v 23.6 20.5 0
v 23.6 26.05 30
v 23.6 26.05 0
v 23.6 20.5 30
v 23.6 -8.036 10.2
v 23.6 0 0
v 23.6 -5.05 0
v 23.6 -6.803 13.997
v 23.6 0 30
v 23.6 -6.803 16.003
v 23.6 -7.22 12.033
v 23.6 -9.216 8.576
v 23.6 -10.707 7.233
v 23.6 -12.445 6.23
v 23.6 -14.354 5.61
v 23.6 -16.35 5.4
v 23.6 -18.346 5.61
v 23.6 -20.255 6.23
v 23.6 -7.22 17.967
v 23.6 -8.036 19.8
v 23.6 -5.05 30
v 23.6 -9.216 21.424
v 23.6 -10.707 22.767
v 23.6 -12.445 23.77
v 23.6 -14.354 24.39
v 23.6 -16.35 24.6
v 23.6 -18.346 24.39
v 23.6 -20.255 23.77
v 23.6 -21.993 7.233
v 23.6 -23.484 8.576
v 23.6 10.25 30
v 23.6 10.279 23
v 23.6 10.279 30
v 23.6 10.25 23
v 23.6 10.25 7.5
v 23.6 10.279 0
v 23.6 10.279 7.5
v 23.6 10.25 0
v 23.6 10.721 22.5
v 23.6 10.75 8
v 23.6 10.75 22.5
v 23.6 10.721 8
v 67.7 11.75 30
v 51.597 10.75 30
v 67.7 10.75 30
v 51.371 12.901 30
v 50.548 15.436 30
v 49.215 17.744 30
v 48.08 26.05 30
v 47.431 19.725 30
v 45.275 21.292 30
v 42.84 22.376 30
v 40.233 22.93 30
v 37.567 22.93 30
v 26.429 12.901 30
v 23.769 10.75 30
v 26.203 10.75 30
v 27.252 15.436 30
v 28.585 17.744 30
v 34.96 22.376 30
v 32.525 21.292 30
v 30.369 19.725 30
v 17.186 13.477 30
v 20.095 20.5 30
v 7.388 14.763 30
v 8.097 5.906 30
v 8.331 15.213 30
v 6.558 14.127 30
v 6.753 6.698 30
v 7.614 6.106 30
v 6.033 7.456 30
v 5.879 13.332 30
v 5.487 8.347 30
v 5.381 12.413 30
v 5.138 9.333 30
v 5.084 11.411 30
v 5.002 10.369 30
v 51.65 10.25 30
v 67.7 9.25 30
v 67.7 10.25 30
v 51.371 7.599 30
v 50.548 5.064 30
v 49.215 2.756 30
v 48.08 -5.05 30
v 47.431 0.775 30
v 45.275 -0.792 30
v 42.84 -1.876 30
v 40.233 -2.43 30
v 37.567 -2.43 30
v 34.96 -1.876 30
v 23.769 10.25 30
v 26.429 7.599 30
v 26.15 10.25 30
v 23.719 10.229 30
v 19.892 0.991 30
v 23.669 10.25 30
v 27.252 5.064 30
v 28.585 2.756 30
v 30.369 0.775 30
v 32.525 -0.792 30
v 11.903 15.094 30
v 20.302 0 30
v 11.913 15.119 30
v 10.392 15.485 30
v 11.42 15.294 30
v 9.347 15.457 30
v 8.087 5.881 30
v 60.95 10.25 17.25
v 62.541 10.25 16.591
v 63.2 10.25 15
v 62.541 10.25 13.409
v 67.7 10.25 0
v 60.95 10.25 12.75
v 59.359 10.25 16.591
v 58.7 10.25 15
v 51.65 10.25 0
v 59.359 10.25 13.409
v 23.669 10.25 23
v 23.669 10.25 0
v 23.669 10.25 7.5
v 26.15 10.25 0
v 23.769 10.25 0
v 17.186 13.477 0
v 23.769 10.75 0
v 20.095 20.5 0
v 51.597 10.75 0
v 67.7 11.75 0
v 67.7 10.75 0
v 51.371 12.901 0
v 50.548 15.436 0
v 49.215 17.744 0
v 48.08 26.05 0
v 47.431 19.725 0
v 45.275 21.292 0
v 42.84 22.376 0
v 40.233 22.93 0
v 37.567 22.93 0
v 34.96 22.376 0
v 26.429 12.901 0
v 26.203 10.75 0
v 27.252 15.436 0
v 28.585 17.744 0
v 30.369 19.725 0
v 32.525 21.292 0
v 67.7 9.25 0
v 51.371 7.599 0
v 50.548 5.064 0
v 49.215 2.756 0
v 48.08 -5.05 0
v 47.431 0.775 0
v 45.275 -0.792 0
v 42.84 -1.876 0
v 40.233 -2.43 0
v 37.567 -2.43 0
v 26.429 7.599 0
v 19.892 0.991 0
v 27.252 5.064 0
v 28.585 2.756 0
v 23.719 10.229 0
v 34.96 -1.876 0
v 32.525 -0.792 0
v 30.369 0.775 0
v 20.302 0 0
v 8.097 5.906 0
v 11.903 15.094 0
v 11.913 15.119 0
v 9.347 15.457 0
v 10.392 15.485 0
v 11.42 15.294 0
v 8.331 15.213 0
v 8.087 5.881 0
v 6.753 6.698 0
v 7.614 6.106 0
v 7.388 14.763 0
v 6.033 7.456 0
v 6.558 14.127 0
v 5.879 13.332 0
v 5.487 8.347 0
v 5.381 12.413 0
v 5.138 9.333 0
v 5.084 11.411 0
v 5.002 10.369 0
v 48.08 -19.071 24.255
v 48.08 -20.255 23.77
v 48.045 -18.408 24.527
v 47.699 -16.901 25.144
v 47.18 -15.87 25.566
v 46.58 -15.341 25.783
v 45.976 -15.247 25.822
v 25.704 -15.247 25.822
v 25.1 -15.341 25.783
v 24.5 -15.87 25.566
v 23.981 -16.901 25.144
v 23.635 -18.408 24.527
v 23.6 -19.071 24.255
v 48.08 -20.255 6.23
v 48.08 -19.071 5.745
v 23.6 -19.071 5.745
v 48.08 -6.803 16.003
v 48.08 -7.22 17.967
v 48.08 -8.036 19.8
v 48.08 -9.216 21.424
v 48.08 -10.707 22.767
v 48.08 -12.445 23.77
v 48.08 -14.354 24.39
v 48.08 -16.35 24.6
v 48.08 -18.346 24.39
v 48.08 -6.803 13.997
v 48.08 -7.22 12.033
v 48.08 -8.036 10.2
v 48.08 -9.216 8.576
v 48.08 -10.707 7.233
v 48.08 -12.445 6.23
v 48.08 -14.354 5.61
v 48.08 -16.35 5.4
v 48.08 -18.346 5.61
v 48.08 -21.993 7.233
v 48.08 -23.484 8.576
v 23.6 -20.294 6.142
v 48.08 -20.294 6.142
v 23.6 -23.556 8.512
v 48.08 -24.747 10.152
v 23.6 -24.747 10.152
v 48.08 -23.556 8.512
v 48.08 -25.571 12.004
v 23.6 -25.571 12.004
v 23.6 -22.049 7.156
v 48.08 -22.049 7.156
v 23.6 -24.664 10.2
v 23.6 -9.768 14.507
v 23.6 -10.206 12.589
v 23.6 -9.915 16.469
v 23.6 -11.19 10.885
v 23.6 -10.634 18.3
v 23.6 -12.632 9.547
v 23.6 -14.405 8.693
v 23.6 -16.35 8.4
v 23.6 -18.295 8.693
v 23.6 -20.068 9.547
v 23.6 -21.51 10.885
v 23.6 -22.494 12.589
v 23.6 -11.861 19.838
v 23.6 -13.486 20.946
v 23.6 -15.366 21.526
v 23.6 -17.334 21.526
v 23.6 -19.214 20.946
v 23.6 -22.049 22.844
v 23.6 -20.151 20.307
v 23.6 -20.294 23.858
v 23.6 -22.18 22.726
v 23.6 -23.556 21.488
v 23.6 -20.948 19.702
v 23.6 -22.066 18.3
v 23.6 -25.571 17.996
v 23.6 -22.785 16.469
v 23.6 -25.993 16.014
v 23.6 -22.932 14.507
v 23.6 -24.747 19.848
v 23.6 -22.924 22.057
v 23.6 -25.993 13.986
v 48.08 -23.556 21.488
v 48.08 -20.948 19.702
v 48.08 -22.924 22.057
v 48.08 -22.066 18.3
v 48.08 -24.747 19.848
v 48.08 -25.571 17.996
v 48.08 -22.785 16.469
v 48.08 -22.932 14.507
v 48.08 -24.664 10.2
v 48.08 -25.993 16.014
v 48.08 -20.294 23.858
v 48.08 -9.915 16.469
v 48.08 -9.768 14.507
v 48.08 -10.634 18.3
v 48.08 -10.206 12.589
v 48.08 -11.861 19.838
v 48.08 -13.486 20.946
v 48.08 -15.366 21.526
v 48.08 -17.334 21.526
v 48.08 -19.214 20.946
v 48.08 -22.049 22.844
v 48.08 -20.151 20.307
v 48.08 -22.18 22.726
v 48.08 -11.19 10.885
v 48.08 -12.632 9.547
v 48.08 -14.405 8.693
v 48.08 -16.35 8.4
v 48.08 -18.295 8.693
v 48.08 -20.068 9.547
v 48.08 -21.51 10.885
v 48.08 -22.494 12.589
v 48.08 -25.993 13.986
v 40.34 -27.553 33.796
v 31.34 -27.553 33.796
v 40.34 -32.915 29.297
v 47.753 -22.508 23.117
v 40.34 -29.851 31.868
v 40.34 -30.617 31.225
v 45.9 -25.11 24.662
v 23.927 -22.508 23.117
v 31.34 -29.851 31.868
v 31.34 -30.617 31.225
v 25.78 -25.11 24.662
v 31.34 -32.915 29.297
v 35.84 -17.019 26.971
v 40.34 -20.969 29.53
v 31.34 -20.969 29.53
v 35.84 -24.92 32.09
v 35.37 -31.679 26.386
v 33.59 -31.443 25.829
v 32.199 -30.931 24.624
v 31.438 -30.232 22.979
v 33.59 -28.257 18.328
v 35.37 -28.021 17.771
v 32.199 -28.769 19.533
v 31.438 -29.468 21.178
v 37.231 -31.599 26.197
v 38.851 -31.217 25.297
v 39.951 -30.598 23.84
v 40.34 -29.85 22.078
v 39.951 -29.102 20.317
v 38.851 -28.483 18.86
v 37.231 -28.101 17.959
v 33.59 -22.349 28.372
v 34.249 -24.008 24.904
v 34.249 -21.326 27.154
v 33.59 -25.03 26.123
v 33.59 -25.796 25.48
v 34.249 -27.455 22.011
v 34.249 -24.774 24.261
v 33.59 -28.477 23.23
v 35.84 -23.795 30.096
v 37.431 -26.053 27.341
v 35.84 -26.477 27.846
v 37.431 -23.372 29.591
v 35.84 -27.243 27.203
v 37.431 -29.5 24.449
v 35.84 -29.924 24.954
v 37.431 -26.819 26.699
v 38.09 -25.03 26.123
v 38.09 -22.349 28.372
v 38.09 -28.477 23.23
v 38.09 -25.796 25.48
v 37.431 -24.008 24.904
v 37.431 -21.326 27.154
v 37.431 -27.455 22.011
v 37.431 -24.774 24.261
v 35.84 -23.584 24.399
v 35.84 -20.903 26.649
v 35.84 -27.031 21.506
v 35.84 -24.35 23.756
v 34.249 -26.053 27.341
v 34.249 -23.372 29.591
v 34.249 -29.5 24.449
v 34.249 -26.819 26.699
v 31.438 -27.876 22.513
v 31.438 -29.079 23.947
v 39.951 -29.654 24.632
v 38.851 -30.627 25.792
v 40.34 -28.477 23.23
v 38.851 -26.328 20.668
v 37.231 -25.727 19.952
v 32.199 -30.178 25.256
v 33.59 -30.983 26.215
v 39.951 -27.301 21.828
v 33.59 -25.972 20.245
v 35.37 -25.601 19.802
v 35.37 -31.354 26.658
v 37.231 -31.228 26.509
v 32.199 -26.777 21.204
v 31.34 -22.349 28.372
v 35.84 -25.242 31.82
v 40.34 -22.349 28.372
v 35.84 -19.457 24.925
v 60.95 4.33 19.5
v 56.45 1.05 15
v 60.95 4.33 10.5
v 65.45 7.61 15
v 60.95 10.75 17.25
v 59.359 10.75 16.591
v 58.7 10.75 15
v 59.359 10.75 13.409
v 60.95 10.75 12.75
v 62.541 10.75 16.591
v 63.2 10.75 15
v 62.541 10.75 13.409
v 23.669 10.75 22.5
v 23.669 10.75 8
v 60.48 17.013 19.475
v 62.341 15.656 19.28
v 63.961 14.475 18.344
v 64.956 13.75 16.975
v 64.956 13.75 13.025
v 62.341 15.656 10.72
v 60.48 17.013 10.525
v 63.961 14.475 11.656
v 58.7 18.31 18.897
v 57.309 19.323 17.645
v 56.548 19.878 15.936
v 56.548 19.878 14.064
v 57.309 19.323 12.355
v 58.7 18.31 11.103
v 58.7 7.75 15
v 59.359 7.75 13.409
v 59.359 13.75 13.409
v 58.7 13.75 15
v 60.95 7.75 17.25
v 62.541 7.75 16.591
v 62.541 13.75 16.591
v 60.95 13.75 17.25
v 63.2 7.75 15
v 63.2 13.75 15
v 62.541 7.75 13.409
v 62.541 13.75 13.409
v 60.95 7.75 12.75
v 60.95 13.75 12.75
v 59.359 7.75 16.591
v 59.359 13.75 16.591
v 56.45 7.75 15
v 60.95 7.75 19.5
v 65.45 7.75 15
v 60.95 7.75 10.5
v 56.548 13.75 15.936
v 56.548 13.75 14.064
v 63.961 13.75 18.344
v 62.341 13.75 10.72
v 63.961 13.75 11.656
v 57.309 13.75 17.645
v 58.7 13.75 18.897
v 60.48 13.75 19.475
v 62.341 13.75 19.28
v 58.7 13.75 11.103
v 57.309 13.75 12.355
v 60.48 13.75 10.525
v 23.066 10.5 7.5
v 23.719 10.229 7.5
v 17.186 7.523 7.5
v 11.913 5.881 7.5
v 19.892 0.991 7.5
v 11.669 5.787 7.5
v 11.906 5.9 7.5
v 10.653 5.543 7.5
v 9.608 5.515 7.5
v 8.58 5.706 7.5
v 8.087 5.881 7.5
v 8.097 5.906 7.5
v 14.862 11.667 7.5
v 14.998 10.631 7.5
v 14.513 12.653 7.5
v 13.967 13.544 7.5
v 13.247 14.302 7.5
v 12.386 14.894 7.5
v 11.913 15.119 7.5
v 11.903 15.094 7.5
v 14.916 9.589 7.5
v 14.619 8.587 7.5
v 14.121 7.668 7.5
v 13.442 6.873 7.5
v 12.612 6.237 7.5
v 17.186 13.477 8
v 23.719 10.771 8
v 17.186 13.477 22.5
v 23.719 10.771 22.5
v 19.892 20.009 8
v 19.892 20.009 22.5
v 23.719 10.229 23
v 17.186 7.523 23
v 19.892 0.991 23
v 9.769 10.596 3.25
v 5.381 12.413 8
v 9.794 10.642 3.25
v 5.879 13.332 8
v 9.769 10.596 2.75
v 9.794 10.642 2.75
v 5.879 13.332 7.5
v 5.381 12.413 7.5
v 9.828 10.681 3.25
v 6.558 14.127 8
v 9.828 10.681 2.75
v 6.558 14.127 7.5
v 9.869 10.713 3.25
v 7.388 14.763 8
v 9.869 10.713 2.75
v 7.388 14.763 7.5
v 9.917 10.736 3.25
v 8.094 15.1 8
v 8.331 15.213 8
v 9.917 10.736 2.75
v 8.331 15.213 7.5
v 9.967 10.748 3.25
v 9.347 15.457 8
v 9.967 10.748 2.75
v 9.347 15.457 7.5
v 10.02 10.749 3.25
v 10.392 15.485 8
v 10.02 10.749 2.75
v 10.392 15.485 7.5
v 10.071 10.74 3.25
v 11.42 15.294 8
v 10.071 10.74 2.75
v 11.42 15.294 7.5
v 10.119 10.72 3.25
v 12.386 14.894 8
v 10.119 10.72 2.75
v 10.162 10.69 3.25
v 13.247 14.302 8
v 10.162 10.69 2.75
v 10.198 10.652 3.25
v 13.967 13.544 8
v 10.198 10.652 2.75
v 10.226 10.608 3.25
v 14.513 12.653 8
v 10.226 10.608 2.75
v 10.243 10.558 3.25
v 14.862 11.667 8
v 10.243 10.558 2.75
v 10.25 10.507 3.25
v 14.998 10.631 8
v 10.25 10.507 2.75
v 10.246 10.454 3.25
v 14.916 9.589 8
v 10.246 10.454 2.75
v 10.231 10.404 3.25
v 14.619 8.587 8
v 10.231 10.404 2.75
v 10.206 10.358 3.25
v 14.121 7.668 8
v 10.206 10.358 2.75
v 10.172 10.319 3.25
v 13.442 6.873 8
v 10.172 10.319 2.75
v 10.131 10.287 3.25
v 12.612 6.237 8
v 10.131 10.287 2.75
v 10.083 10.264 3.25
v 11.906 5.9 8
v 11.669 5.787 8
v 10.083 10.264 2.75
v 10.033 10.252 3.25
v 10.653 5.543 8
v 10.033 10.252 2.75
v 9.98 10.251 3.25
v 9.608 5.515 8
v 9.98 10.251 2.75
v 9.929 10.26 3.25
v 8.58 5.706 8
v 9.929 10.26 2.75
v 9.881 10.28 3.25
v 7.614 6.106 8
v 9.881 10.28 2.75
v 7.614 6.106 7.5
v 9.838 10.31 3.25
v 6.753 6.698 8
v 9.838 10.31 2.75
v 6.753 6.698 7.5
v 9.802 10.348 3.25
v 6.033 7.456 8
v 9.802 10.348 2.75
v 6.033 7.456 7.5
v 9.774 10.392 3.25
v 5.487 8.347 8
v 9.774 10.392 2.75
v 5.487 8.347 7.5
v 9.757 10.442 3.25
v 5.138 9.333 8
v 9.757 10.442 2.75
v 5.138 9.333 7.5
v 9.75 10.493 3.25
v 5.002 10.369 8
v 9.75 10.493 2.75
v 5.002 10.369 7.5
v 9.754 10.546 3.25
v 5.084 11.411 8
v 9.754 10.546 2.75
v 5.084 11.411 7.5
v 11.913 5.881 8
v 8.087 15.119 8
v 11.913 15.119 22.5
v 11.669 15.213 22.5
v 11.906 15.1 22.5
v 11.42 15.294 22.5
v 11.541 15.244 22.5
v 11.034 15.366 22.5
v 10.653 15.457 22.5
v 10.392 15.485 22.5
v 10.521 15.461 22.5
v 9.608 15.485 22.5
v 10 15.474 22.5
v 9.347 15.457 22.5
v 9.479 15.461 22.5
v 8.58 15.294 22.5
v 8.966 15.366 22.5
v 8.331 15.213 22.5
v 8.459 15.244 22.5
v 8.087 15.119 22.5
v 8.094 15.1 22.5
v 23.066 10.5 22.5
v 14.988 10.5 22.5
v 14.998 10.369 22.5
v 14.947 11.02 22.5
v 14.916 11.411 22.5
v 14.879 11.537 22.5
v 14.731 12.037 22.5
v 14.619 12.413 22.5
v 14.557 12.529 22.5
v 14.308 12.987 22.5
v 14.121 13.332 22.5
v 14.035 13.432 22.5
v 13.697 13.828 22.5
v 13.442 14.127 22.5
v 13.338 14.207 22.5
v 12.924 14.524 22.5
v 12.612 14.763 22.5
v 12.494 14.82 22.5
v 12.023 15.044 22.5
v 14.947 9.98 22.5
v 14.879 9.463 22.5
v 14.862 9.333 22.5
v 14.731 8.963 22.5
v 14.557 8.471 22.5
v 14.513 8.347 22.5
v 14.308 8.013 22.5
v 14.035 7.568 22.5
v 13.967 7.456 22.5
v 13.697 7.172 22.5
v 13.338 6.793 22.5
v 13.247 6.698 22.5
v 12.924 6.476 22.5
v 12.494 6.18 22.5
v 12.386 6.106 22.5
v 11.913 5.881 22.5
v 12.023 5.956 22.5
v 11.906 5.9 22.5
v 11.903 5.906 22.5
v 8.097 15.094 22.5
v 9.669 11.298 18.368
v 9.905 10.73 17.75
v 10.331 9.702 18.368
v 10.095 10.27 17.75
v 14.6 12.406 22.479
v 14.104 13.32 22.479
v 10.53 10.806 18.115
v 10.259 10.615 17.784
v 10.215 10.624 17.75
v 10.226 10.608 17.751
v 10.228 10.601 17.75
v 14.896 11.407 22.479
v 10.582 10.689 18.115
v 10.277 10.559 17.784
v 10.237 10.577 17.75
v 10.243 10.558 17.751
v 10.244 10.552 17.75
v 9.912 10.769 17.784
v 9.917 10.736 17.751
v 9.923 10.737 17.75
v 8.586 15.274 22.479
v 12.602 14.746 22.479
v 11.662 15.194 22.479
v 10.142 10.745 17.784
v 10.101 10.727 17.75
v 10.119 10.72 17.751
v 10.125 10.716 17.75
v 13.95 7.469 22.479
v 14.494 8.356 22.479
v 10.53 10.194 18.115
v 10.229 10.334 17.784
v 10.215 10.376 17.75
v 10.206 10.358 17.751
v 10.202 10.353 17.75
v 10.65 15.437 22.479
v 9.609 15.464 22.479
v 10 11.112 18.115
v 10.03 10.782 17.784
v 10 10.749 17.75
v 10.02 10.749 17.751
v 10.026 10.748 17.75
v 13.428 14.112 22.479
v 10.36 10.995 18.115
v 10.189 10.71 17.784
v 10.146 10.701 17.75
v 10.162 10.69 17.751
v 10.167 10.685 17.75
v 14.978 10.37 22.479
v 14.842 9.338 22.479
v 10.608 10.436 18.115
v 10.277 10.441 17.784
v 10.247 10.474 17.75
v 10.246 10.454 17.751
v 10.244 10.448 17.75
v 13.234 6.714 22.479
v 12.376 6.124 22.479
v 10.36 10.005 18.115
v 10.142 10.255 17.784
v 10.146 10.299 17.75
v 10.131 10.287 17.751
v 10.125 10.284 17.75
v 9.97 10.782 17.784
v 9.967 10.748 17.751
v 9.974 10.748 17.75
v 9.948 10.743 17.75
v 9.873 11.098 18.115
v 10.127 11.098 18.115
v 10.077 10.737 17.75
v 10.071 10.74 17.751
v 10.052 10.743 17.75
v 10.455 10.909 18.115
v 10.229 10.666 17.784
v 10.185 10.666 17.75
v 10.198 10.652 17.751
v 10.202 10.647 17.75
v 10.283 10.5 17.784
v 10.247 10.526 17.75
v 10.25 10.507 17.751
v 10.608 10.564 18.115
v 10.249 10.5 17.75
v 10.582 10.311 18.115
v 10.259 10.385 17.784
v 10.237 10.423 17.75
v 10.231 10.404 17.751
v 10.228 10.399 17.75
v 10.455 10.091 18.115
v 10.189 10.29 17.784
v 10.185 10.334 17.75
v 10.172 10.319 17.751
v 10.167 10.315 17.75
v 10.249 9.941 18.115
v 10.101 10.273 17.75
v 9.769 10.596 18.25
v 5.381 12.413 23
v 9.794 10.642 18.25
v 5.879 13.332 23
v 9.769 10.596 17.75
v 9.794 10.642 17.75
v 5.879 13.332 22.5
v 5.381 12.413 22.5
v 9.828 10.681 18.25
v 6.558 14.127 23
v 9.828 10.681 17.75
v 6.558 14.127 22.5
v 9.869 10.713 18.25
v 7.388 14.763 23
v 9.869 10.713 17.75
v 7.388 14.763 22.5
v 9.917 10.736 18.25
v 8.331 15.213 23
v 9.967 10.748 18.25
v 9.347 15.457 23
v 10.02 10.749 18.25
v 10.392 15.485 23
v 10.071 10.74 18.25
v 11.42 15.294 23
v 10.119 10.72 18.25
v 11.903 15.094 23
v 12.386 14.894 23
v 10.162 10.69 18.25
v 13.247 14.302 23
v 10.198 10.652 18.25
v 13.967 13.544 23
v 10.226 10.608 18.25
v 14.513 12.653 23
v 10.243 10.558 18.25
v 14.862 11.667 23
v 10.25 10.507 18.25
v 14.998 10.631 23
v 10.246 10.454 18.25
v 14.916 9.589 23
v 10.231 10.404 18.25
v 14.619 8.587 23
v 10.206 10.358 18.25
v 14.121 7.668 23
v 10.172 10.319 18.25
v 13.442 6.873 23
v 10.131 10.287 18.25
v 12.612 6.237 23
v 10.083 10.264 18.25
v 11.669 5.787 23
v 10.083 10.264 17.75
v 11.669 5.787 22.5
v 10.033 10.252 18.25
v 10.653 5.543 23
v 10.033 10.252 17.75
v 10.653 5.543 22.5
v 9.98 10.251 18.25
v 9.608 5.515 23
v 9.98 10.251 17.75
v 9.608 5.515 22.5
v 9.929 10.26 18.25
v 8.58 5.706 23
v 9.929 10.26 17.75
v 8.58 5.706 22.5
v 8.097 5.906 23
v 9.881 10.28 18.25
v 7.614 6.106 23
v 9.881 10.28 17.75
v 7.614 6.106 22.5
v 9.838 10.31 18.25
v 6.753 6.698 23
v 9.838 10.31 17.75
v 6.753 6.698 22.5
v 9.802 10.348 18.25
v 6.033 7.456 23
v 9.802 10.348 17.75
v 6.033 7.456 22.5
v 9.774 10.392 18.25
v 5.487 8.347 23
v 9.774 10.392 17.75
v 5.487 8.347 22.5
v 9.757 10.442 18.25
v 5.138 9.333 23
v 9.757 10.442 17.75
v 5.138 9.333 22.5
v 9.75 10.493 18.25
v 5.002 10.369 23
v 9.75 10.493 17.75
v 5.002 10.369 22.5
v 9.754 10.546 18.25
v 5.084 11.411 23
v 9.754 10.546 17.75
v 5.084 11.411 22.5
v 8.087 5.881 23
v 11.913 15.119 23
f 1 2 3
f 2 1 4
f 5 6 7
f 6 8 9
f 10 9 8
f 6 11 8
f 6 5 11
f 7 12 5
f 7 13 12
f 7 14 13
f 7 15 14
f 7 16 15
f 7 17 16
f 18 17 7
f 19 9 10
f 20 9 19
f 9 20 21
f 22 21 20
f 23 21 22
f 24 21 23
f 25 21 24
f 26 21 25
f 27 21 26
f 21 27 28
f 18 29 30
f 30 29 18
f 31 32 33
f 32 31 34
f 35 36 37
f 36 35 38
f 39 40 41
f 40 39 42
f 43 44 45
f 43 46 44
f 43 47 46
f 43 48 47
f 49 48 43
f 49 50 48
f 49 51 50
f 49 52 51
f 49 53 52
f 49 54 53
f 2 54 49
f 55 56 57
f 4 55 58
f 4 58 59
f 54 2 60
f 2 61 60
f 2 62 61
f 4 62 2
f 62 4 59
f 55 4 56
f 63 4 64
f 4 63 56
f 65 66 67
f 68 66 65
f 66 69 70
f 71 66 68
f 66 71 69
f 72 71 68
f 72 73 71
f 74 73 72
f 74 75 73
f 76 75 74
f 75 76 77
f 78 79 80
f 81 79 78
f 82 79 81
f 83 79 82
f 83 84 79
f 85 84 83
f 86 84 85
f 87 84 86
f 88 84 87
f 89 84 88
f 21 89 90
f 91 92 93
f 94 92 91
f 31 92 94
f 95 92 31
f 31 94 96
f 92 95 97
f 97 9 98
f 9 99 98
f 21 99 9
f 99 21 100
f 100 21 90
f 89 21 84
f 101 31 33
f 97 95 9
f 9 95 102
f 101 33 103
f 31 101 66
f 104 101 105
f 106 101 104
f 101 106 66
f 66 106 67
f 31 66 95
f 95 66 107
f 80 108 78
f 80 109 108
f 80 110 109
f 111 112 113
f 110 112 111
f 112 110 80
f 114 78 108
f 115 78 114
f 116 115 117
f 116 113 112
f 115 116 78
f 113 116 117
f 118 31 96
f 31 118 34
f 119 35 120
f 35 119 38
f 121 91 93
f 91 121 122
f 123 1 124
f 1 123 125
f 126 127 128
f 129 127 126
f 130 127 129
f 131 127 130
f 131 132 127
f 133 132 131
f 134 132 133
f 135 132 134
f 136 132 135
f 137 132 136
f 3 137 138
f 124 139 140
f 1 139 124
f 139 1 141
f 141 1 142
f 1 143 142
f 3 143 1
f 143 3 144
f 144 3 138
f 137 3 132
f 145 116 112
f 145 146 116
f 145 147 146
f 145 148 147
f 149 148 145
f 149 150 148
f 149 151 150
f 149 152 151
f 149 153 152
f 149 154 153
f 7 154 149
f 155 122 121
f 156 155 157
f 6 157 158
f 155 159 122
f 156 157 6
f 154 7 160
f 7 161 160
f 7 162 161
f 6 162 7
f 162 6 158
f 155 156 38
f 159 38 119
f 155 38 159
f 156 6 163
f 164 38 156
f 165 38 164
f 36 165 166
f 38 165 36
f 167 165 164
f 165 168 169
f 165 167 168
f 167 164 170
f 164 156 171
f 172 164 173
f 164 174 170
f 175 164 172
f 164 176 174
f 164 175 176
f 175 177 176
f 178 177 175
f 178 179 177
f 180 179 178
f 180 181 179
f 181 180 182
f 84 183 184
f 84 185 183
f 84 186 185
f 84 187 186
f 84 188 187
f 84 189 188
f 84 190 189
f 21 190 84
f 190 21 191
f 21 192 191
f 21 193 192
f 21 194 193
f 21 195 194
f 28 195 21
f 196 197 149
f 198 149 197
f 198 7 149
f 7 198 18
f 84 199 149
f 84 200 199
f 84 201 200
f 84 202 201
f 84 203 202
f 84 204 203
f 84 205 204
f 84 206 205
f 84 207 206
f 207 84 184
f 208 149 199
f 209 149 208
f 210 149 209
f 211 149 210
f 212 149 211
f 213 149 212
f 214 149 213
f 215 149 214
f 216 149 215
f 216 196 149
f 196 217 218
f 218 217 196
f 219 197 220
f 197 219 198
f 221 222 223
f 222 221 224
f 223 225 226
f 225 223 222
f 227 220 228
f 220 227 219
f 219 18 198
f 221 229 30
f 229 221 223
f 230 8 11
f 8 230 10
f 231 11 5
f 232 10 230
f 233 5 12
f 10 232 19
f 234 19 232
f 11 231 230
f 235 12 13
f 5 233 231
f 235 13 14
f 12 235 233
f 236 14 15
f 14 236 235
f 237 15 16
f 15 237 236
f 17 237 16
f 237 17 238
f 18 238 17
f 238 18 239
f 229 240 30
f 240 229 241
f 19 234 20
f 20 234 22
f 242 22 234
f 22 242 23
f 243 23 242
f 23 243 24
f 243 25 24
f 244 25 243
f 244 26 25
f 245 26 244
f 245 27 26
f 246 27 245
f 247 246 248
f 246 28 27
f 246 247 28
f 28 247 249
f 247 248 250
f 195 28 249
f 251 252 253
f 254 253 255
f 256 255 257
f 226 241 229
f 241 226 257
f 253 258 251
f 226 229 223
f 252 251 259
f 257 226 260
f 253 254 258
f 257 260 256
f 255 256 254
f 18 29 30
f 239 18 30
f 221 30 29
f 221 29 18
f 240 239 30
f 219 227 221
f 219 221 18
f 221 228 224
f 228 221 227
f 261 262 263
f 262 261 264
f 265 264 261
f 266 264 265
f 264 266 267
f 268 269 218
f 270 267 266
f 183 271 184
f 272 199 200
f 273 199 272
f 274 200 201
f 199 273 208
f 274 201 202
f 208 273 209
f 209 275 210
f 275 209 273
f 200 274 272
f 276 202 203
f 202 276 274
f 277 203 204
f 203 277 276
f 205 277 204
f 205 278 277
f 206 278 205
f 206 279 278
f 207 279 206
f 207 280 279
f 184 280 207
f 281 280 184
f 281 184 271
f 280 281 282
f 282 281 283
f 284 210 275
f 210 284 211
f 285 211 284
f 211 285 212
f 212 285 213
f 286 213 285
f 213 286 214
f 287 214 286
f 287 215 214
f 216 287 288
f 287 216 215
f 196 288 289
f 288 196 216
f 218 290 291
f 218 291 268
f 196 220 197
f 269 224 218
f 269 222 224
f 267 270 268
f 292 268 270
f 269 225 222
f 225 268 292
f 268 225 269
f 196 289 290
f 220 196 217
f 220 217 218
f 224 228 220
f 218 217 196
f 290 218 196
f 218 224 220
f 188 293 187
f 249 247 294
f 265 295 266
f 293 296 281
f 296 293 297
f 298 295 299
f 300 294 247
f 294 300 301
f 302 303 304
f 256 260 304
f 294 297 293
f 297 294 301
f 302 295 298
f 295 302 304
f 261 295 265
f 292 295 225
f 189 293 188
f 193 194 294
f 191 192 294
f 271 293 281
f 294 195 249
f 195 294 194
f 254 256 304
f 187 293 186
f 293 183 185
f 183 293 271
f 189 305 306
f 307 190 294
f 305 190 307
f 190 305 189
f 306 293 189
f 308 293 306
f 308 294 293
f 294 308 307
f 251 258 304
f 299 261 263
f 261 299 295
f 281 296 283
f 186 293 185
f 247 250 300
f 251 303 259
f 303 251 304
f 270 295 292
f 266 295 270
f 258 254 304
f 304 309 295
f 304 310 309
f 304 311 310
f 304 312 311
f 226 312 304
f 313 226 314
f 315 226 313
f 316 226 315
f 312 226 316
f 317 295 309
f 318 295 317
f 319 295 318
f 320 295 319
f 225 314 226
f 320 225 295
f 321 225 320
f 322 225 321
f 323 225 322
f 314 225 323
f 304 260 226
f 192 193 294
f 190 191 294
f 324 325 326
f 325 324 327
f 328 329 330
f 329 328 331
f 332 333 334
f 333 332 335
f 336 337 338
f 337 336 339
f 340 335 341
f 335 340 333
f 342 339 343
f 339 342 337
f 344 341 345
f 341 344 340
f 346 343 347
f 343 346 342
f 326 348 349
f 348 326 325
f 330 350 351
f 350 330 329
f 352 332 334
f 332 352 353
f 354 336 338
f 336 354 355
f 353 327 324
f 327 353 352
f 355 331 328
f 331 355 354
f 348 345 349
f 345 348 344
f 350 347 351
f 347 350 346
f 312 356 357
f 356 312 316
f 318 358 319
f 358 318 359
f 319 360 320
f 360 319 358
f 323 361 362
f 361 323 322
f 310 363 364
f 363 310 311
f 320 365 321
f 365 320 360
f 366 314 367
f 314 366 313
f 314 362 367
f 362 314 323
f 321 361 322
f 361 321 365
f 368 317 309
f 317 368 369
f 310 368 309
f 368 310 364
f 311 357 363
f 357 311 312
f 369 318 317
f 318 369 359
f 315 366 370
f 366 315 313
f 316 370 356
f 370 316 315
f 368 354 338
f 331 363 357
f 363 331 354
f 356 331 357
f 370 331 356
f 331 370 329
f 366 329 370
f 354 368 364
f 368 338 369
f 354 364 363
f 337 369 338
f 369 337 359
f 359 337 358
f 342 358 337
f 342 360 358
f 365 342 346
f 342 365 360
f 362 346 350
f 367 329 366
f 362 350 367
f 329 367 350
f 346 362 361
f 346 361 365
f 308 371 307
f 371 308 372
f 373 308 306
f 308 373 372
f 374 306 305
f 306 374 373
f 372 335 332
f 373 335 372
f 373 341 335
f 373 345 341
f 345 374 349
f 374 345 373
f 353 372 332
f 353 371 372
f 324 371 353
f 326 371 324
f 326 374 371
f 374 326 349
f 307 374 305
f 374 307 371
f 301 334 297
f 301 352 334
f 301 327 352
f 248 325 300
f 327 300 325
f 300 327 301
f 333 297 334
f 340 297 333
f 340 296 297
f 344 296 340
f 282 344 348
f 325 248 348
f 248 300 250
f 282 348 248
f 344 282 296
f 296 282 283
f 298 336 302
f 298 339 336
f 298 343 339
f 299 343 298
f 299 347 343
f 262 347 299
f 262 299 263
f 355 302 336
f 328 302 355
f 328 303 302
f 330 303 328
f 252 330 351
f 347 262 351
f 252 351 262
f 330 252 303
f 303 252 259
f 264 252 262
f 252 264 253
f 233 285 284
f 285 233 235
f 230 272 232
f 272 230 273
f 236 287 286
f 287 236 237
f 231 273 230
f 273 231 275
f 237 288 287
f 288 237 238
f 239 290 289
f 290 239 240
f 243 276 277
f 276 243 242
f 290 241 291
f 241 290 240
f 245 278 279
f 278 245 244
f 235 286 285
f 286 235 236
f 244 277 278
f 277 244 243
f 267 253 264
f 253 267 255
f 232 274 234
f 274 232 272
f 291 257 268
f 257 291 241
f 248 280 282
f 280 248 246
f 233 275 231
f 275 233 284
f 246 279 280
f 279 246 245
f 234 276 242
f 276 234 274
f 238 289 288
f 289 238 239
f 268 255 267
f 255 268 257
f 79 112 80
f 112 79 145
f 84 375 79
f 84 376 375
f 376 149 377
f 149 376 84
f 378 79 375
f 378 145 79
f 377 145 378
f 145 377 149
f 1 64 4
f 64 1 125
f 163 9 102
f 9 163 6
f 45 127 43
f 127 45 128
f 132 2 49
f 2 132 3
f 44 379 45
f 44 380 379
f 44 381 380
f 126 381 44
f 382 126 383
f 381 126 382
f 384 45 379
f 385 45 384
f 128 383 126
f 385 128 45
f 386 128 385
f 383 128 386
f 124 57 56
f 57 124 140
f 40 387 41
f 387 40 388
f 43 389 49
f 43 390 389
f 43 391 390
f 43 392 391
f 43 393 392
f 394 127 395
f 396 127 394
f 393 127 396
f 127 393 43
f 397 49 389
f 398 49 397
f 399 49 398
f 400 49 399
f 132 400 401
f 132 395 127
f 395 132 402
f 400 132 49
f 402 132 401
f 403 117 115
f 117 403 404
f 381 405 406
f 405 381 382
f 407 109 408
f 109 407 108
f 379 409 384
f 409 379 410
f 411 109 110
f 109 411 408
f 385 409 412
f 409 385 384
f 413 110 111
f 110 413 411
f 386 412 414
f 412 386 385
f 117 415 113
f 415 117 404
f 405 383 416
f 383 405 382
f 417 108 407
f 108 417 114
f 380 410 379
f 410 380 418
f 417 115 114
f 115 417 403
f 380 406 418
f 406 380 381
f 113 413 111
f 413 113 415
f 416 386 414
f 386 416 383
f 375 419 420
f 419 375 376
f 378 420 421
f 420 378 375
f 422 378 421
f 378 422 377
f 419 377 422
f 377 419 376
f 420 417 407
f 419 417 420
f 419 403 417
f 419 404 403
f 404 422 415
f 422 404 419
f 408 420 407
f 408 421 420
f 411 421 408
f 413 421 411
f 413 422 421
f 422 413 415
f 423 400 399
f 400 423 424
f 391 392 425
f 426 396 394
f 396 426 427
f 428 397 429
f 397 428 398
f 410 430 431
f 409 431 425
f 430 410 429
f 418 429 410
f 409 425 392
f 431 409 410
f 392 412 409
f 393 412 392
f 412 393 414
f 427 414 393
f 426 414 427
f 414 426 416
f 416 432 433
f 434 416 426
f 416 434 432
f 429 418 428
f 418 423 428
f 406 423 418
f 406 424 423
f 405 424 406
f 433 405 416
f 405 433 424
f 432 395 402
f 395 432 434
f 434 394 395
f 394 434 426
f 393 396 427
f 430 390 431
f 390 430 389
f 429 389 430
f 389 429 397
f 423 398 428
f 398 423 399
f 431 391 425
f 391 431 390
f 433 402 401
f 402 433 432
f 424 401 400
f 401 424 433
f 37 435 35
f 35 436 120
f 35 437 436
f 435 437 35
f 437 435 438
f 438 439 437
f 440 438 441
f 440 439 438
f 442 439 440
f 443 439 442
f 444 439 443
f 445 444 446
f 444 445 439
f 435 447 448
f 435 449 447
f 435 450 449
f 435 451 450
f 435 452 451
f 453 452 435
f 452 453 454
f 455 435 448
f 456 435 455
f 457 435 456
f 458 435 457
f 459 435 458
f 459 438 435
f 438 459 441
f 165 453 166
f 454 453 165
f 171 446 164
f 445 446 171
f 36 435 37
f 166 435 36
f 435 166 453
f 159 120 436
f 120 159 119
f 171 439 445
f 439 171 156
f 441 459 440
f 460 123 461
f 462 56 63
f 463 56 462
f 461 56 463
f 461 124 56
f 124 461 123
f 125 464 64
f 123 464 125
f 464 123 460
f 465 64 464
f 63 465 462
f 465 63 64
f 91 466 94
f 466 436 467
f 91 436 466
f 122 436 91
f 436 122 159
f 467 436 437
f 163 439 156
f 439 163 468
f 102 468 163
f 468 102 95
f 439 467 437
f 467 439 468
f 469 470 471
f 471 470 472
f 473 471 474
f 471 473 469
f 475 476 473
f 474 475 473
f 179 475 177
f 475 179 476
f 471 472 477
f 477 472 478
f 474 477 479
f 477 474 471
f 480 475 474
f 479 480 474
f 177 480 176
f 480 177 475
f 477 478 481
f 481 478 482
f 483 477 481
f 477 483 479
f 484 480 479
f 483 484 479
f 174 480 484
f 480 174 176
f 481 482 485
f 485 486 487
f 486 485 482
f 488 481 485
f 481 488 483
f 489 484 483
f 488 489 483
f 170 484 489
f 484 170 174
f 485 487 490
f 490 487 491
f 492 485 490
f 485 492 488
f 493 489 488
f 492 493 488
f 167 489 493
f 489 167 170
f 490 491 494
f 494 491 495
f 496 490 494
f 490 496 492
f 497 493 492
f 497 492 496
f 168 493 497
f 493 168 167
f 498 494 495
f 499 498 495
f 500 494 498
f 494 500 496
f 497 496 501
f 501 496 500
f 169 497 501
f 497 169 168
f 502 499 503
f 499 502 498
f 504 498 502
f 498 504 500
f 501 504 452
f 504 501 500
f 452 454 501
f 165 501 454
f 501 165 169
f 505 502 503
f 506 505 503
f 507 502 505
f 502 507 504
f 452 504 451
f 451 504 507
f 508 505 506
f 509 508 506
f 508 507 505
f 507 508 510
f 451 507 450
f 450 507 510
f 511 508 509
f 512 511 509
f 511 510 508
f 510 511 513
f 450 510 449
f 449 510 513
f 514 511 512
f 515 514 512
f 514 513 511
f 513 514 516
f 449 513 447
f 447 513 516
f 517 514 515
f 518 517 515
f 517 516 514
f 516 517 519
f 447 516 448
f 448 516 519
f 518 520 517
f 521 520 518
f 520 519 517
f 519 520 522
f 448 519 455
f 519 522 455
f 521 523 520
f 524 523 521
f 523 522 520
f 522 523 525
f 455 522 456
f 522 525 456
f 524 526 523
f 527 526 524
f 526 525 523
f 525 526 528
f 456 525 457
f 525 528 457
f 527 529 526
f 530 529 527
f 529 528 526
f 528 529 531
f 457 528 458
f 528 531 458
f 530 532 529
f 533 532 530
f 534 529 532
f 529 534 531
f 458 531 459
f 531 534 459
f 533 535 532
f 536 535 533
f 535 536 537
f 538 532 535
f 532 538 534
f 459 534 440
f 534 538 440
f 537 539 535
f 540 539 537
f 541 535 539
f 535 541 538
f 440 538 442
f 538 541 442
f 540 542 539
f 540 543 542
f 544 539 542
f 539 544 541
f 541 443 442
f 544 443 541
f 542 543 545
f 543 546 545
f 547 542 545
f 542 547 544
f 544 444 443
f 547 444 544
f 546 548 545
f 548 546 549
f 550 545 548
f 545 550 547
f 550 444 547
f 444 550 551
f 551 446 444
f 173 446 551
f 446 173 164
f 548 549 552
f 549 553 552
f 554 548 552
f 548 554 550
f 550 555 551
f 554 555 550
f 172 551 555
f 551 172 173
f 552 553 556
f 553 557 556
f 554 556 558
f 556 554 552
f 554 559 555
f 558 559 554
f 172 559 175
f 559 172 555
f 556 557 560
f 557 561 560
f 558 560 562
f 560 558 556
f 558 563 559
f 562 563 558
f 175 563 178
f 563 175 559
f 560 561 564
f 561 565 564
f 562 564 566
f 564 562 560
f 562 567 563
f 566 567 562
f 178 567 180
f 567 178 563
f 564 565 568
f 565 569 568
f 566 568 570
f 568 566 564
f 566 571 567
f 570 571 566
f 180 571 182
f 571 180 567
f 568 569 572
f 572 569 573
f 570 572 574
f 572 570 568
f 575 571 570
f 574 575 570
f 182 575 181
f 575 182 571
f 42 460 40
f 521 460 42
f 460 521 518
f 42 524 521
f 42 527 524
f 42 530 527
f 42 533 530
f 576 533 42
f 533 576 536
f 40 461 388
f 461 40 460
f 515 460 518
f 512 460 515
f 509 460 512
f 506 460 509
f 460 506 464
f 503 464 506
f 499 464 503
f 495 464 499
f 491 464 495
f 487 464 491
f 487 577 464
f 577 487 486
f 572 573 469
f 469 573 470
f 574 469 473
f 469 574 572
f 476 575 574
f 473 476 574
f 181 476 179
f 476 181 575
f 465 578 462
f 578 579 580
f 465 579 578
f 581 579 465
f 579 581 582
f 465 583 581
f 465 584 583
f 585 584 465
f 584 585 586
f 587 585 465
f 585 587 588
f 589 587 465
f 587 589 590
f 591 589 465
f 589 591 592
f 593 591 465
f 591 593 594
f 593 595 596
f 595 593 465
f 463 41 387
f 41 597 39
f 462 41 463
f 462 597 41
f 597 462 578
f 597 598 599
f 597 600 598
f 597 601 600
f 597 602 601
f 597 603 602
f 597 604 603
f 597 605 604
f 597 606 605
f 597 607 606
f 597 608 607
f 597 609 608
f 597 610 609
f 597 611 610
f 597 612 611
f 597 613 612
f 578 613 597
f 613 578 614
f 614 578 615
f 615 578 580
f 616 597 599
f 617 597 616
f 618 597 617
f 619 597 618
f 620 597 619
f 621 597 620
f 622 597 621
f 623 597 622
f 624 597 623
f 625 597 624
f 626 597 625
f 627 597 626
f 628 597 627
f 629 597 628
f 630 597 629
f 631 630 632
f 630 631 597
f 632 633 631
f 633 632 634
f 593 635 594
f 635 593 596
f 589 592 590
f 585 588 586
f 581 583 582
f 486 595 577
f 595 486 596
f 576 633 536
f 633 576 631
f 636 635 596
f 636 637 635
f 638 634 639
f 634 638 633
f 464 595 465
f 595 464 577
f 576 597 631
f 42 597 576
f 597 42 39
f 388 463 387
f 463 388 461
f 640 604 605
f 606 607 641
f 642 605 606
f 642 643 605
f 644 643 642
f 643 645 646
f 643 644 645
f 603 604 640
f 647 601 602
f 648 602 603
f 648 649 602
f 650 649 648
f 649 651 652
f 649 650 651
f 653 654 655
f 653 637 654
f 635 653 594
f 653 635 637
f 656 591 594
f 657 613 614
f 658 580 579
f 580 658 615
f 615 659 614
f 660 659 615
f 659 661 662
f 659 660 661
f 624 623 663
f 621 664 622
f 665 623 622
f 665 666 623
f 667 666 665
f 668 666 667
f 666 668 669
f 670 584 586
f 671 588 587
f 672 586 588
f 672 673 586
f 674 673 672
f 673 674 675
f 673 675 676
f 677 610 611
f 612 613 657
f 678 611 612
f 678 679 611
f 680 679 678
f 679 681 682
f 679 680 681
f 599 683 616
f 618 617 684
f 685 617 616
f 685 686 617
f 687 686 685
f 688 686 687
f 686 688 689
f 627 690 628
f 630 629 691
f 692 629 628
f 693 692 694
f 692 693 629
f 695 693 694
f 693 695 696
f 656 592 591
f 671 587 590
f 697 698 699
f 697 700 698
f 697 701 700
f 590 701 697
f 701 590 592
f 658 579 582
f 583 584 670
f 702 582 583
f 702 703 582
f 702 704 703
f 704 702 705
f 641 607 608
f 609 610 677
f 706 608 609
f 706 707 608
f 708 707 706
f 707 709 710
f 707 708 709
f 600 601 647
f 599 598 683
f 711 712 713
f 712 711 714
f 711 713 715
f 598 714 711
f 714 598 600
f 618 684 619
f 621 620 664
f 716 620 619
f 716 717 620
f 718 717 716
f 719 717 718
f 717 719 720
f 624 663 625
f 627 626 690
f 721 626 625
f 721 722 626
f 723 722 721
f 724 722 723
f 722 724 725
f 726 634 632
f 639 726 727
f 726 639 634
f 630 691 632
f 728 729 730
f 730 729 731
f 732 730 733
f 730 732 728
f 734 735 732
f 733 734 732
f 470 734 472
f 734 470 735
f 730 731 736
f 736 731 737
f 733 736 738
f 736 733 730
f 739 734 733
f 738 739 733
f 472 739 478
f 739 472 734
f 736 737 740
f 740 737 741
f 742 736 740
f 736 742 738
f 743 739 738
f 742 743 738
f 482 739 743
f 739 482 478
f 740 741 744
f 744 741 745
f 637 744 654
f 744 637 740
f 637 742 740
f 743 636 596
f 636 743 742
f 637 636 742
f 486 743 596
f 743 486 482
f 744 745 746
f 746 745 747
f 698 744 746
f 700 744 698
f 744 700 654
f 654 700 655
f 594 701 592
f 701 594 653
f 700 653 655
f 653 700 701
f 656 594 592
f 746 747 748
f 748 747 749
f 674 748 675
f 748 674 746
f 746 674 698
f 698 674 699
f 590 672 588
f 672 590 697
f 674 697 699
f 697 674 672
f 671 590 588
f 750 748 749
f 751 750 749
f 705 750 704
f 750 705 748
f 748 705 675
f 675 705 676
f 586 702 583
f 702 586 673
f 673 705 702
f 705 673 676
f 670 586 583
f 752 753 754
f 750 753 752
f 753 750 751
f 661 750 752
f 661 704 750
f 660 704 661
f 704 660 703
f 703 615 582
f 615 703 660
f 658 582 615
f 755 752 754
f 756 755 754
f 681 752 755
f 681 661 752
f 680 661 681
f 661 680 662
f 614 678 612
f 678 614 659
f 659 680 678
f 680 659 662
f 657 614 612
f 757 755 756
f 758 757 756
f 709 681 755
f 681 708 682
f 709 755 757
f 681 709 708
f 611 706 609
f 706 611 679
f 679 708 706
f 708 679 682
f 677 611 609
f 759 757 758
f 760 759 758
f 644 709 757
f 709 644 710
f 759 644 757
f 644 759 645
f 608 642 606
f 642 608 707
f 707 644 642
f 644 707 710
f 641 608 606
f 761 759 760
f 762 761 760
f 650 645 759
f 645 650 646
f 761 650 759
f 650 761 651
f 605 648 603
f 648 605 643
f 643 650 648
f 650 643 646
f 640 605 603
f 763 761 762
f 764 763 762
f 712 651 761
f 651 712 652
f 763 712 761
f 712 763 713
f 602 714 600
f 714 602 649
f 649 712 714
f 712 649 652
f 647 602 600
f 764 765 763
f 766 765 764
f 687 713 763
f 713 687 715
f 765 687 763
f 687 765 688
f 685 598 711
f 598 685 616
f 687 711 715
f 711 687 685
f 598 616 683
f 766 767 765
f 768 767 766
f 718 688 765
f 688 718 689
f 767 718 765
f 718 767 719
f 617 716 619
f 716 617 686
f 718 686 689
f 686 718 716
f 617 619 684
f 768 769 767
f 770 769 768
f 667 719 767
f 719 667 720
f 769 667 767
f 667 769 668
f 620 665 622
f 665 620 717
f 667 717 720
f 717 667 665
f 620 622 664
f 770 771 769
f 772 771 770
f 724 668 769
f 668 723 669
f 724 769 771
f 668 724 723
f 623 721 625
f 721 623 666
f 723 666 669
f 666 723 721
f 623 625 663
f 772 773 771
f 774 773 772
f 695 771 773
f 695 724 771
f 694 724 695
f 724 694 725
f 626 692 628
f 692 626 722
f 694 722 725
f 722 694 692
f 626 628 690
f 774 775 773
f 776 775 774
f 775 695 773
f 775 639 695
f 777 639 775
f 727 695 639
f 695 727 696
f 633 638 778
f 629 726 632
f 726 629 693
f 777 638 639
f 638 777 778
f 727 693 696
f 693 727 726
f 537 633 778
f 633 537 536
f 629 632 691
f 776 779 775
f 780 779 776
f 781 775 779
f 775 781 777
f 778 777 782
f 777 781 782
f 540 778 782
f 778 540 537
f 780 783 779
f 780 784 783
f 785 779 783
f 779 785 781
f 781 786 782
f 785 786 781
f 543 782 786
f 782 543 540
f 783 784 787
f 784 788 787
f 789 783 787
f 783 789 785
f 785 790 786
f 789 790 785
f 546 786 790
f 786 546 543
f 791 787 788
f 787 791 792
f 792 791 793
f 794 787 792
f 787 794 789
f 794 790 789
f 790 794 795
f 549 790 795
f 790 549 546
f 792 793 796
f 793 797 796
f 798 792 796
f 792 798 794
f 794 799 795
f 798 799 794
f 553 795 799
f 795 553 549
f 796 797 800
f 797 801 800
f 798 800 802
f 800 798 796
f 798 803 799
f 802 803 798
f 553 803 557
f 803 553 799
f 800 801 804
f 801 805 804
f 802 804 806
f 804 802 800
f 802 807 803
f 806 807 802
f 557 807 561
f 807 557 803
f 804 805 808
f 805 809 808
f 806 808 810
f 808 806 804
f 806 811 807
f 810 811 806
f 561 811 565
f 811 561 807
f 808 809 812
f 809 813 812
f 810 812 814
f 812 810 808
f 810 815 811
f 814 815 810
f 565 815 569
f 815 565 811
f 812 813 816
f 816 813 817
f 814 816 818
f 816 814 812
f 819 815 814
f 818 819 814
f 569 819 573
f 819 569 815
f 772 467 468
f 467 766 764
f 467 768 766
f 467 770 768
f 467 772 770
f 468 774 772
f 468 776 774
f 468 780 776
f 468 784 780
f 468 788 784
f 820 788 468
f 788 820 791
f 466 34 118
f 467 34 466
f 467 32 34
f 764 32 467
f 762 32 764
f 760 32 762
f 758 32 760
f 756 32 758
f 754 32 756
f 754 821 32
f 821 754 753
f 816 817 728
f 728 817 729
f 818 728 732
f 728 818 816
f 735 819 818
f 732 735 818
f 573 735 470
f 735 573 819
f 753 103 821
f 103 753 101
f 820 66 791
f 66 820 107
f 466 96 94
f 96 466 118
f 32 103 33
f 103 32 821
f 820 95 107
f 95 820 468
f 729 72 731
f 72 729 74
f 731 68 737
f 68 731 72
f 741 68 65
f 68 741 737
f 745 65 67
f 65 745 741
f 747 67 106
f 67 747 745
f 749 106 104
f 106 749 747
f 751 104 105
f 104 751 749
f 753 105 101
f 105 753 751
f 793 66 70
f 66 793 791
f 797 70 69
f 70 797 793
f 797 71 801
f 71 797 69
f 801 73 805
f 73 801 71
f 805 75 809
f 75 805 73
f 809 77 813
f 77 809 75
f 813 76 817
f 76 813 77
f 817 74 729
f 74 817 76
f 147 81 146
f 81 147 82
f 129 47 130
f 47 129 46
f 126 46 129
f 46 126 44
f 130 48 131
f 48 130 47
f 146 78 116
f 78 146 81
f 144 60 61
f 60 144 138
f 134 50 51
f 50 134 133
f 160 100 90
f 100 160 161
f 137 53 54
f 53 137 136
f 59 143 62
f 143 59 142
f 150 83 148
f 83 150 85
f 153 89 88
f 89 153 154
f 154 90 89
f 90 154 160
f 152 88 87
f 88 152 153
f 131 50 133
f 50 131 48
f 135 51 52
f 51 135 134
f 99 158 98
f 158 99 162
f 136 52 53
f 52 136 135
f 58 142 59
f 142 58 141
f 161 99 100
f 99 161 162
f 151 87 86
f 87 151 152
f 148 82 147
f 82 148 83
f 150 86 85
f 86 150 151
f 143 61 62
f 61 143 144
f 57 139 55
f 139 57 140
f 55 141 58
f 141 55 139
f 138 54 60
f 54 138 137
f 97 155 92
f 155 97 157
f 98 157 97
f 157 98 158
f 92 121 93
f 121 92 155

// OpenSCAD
$fn = 0;

//$fs = 0.1; // HQ cylinders
//$fa = 4; // HQ spheres/hulls
render_hinges = true;

//$fs = 2; // default
//$fa = 12; // default
//render_hinges = false;

clamp_height = 30;
pole_diam = 25 +0.5;
screw_hole_diam = 4.5;
screw_recess_diam = 9;
nut_type = 4; // 4=square, 6=hex
horiz_pole_diam = 13 +0.2;

hinged_pole_clamp(
  height=clamp_height,
  hole_diam=screw_hole_diam,
  hole_recess_diam=screw_recess_diam,
  horiz_diam=horiz_pole_diam,
  nut_type=nut_type,
  pole_diam=pole_diam);


module hinged_pole_clamp(
    height,
    hole_diam,
    pole_diam,
    hole_recess_diam,
    horiz_diam,
    horiz_tab_angle=40,
    horiz_thick=3,
    nut_type=6
){
  hinge_fill_x = 23.6; //hardcoded to fit the hinge footprint
  hinge_fill_y = 20;
  hinge_fill_z = height;
  hole_r = hole_diam/2;
  pole_r = pole_diam/2;
  hole_recess_r = hole_recess_diam/2;

  hpole_r = horiz_diam/2;

  half_space = 0.5; // gap between the two halfs
  half_width = pole_diam * 1.2;
  half_depth = pole_diam * 0.6;

  flap_width = 1;
  flap_height = hole_recess_diam*1.5;

  hinge_r1 = 5;
  num_hinges = clamp_height/(hinge_r1*2) - 1;

  difference (){

    union(){


      //one half
      hull(){
        translate([
            hinge_fill_x,
            0-(half_depth-((hinge_fill_y+half_space)/2)),
            0])
            cube(size=[half_width*0.8, half_depth, hinge_fill_z]);

        translate([
            hinge_fill_x+(half_width*0.8),
            (0-(half_depth-((hinge_fill_y+half_space)/2)))+half_depth-flap_width,
            0])
            cube(size=[
              (half_width*0.2)+(hole_recess_diam*1.5),
              flap_width,
              hinge_fill_z
            ]);

      }

      difference(){
        hull(){
          translate([
            hinge_fill_x,
            0-(half_depth-((hinge_fill_y+half_space)/2)),
            0])
              cube(size=[half_width*0.8, half_depth, hinge_fill_z]);

          translate([
              hinge_fill_x,
              0-(pole_diam/2)+(horiz_thick)-(hpole_r),
              height/2])
            pole_with_tabs_neg(
              width=half_width*0.8,
              pole_r=hpole_r,
              pole_thick=horiz_thick,
              hole_diam=screw_hole_diam,
              tab=false,
              tab_angle=horiz_tab_angle);
        }

        translate([
            hinge_fill_x-(pole_diam*0.1),
            0-(pole_diam/2)+(horiz_thick)-(hpole_r),
            height/2])
          pole_with_tabs_neg(
            width=half_width*0.9,
            pole_r=hpole_r,
            pole_thick=horiz_thick,
            hole_diam=screw_hole_diam,
            tab=true,
            tab_angle=horiz_tab_angle);

      }
      //hinge fill
      translate([0, 0, 0])
          cube(size=[hinge_fill_x, hinge_fill_y+half_space, hinge_fill_z]);

      //the other half
      hull(){
        translate([
          hinge_fill_x, (0-(half_depth-((hinge_fill_y+half_space)/2)))+half_depth+half_space,
          0
        ])
          cube(size=[half_width*0.8, half_depth, hinge_fill_z]);

        translate([
          hinge_fill_x+(half_width*0.8),
          (0-(half_depth-((hinge_fill_y+half_space)/2)))+half_depth+half_space,
          0
        ])
          cube(size=[
            (half_width*0.2)+(hole_recess_diam*1.5),
            flap_width,
            hinge_fill_z
          ]);
      }

      translate([
          hinge_fill_x,
          //0-(hinge_fill_y/2)-(hinge_fill_y-half_depth)+(horiz_thick/2),
          0-(pole_diam/2)+(horiz_thick)-(hpole_r),
          height/2])
        pole_with_tabs(
          width=half_width*0.8,
          pole_r=hpole_r,
          pole_thick=horiz_thick,
          hole_diam=screw_hole_diam,
          hole_recess_diam=screw_recess_diam,
          nut_type=nut_type,
          tab_angle=horiz_tab_angle);

    }

    translate([
        hinge_fill_x+(half_width*1)+(hole_recess_diam*0.75),

        (0-(half_depth-((hinge_fill_y+half_space)/2)))+half_depth+half_space,
        height/2]){

      rotate(a=90, v=[1,0,0]){
        cylinder(h=pole_diam*1.5, r=hole_r, center=true);

        translate([0,0,0+(half_depth/2)+3])
          cylinder(h=half_depth, r=hole_recess_r, center=true, $fn=nut_type);

        translate([0,0,0-(half_depth/2)-3])
          cylinder(h=half_depth, r=hole_recess_r, center=true);
      }
    }

    //pole hole
    translate([hinge_fill_x+(half_width/2), (hinge_fill_y+half_space)/2, -(((height*1.1)-hinge_fill_z)/2)]) {
      rotate(a=90, v=[0,0,0])
        cylinder(h=(height*1.1), r=pole_r);
    }

    //hinges
    if(render_hinges)
      translate([10, (hinge_fill_y+(half_space*2))/2 ,0])
        rotate(a=(-45/2), v=[0,0,1])
          vertical_hinge_negative(theta0=45, height=(hinge_fill_z/num_hinges), n=num_hinges, r1=hinge_r1);

  }
}

/*
* tol - the smallest distance allowable between interlocking parts of your 3d printer. This gap is the vertical (and horizontal) distance between the cones inside the hinge and is also the diameter and height of the small support structure between hinge elements
* r1 - the outer radius of the hinge. the surface of your part should not be farther away from the center of the hinge than this disntace.
* r2 - the furthest radius from the hinge where material is removed from the part.
* height - the height of each hinge element. The total height of the hinge is n*height. (the cut will extent beyond this distance by height/2 on both sides. The part where you are creating the hinge should have a height of n*height) the height must be greater than 2*r1
* n - the number of hinge elements. One hinge element is divided between the top and bottom.
* theta0 - the angle at which the hinge is printed
* theta1 - the internal angle formed when the hinge is turned to its limit in one direction (the x- part of the hinge_test_1 example when rotated clockwise as viewed from above)
* theta2 - the internal angle formed when the hinge is turned to its limit in the opposite direction
*/
module vertical_hinge_negative(tol=0.5,r1=5,r2=15,height=15,n=2,theta0=180,theta1=45,theta2=45) {

    arm_width=2*r1;
    union() {
        for(i=[0:n])
            translate([0,0,(i-0.5)*height])
                difference() {

                    //cone between hinges and cuts around the hinge
                    rotate_extrude()
                        polygon([[r1,0],[r1,height],[tol/2,height-r1+tol/2],
                                [tol/2,height-r1+1.5*tol],[r1,height+tol],
                                [r2,height+tol],[r2,0]]);


                    //exclude a rectangular shape for the arm the connects the hinge to the body
                    rotate((i%2)*theta0)
                        difference() {
                            translate([0,-arm_width/2,-height])
                                cube(size=[r2*2,arm_width,height*2]);

                            translate([0,0,height-r1])
                                cylinder(r1=0,r2=height,h=height);
                        }

                    //exclude a triangular shape that limits the motion of the arms on the side of the hinge
                    for(i=[0,1])
                        mirror([0,i,0])
                            rotate(-i*theta0)
                                translate([0,0,-tol])
                                    linear_extrude(height=height+3*tol)
                                        intersection() {
                                            circle(r=2*r2);

                                            rotate(theta0+180+theta2)
                                                translate([0,r2*3+arm_width/2+tol])
                                                    square(size=[r2*6,r2*6],center=true);

                                            rotate(theta0-theta1)
                                                translate([0,r2*3+arm_width/2+tol])
                                                    square(size=[r2*6,r2*6],center=true);

                                            rotate(theta0)
                                                translate([r2*3,0])
                                                    square(size=[r2*6,r2*6],center=true);
                                        }
            }
       }
}




//*********************************************************

module pole_with_tabs_neg(width, pole_r, pole_thick, hole_diam, tab=false, tab_angle=0, gap=1){
  rotate(a=90, v=[0,1,0]){
    cylinder(h=width, r=pole_r+pole_thick);
  }

  if(tab==true){
    // screw hole in tab
    rotate(a=tab_angle, v=[1,0,0])
      translate([width/2,
                 0,
                 pole_r+(pole_thick)+hole_diam ]) {
        // tab gap
        cube([width*1.1, gap, (hole_diam*2)+(pole_thick*3)], center=true);
      }
  }
}

module pole_with_tabs(width, pole_r, pole_thick, hole_diam, hole_recess_diam, nut_type=6, tab_angle=0, gap=1){
  hole_r = hole_diam/2;
  difference(){
    union(){
      rotate(a=90, v=[0,1,0]){
        cylinder(h=width, r=(pole_r+pole_thick)*1.01);
      }

      // tab block
      hull(){
        rotate(a=90, v=[0,1,0]){
          cylinder(h=width, r=(pole_r+pole_thick)*1.01);
        }
        rotate(a=tab_angle, v=[1,0,0])
          translate([width/2, 0, ((hole_recess_diam)+(pole_thick*2)+pole_r)/2]){
            cube([
              hole_recess_diam,
              (pole_thick*2)+gap,
              (hole_recess_diam)+(pole_thick*2)+pole_r],
              center=true);
          }
        }
    }

    // pole hole
    translate([0-(width*0.5), 0, 0])
      rotate(a=90, v=[0,1,0]){
        cylinder(h=width*2.0, r=pole_r);
      }

    // screw hole in tab
    rotate(a=tab_angle, v=[1,0,0])
      translate([width/2,
                 0,
                 pole_r+(pole_thick)+(hole_recess_diam/2) ]) {

        // screw hole
        rotate(a=90, v=[1,0,0]){
          cylinder(h=pole_r*3, r=hole_r, center=true);

          //nut/screw recesses
          translate([0, 0, 0+(pole_r/2)+(pole_thick+gap)]){
            cylinder(h=pole_r, r=hole_recess_diam/2, center=true);
          }
          translate([0, 0, 0-(pole_r/2)-(pole_thick+gap)]){
            cylinder(h=pole_r, r=hole_recess_diam/2, center=true, $fn=nut_type);
          }
        }

        // tab gap
        cube([width*1.1, gap, (hole_recess_diam*2)+(pole_thick*3)], center=true);
      }
  }

}
